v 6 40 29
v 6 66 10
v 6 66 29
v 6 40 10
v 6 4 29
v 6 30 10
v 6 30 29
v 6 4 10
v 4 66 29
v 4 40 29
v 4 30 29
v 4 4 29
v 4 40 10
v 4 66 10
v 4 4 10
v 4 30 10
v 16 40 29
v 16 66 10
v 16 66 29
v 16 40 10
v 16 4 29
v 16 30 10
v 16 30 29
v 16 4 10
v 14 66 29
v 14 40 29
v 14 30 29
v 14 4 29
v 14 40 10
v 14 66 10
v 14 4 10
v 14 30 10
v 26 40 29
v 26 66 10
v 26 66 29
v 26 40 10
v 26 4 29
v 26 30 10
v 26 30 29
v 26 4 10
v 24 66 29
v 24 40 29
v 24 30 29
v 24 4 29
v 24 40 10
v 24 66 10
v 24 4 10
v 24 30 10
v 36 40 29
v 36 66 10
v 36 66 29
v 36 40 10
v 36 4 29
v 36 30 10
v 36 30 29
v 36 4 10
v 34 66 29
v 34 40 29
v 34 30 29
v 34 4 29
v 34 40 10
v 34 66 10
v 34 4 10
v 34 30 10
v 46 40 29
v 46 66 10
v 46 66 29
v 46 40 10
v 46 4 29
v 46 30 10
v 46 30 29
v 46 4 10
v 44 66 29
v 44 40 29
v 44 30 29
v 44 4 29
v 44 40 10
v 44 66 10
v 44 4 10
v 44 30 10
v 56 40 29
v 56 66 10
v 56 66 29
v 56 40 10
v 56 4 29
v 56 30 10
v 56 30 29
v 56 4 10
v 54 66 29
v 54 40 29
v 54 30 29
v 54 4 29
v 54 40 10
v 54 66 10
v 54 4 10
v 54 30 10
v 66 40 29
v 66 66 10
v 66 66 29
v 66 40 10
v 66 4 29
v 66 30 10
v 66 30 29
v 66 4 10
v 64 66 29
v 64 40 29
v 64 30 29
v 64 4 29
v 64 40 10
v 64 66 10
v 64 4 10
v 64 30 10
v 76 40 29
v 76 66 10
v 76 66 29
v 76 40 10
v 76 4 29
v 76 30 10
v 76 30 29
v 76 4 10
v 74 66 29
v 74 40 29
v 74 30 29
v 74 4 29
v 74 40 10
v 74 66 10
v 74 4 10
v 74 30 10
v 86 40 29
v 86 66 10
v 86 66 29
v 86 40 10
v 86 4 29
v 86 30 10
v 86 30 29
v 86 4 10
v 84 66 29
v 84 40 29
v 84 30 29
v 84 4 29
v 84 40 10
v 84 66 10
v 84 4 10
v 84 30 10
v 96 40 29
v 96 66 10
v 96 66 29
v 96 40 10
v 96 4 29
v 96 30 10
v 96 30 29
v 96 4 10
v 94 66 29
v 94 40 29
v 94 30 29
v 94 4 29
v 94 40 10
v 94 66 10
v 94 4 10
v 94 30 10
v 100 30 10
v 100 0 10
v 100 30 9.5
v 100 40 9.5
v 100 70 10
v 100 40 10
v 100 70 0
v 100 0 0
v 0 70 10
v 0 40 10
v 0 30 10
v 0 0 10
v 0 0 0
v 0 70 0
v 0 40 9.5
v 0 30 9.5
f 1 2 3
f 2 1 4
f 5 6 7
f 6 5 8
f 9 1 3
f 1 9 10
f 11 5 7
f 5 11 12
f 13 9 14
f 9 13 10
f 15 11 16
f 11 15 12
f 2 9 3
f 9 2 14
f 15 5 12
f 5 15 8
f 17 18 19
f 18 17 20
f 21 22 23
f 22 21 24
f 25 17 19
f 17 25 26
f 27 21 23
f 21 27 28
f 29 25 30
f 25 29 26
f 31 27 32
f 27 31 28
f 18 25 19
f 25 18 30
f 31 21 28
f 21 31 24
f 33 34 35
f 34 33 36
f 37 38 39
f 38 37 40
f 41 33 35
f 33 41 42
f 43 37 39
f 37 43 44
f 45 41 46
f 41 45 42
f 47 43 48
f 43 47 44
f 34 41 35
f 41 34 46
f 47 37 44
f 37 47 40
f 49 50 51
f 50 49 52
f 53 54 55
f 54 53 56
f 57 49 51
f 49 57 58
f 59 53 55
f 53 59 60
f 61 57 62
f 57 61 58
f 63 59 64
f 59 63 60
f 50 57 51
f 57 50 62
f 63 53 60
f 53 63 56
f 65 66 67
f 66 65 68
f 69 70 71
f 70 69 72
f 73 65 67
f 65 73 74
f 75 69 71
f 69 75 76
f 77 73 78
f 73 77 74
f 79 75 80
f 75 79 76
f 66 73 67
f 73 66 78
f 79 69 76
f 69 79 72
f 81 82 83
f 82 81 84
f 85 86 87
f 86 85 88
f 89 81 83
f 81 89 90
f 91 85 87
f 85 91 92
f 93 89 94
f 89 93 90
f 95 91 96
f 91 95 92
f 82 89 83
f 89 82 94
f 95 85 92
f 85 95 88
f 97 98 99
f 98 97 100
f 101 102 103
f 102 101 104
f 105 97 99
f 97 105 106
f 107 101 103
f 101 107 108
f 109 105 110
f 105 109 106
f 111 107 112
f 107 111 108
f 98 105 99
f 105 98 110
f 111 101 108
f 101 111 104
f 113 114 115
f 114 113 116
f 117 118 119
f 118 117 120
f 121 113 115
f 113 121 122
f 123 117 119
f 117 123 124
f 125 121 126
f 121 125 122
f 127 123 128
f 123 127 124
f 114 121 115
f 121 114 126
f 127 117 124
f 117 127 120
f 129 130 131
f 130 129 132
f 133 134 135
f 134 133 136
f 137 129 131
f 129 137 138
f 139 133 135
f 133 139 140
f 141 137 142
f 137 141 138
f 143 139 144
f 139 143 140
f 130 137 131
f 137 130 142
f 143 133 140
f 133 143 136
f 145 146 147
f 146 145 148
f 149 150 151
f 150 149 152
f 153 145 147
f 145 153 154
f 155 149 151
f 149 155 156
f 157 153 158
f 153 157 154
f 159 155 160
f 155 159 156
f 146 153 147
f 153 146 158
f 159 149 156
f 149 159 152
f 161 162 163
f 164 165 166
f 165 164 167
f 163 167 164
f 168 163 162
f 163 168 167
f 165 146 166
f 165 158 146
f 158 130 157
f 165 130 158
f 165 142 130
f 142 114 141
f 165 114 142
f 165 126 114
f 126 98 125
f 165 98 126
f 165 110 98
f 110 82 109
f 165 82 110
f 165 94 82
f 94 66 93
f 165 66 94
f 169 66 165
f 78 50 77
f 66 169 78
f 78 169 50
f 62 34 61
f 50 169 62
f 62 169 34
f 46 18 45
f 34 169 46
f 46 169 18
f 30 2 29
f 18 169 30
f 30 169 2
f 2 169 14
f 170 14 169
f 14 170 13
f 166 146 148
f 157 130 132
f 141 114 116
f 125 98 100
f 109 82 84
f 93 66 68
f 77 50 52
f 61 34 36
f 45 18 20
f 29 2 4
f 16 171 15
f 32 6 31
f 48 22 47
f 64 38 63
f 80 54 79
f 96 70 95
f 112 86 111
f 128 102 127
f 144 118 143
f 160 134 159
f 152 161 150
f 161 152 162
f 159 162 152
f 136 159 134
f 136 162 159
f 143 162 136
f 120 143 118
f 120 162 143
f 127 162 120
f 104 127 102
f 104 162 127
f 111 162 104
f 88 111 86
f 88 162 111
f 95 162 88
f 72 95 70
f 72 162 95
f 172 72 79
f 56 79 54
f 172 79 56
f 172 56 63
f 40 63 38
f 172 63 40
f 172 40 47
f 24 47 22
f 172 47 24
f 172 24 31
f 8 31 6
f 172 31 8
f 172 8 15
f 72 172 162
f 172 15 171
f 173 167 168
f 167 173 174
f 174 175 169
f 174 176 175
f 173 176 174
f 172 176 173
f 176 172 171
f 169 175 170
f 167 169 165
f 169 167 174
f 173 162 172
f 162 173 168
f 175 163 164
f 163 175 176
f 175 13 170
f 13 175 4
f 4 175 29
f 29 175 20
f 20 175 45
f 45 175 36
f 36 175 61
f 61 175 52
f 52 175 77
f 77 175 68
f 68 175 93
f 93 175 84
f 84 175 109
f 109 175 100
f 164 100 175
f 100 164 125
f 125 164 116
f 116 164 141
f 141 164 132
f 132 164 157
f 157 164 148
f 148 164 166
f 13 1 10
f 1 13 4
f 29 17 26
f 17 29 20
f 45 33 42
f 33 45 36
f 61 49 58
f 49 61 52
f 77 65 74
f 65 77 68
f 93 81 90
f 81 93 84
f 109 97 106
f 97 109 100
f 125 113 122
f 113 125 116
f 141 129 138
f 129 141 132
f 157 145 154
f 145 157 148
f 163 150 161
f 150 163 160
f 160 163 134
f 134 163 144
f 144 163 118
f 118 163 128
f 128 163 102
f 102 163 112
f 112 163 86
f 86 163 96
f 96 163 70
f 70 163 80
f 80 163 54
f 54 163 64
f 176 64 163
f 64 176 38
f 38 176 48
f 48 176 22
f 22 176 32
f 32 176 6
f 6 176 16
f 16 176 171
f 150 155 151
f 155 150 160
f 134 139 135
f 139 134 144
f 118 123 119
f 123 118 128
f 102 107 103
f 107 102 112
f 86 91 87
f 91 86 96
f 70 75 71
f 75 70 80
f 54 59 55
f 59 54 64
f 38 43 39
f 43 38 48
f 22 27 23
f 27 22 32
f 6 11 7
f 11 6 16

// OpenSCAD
$fn = 32;

// ----------------------------------------------------------------------
// Heatsink: slotted fin block
// ----------------------------------------------------------------------

// --- parameters (mm) ---
base_l = 100;             // base length, X
base_w = 70;              // base width, Y
base_t = 10;              // base plate thickness
fin_h = 20;               // fin height above the base
fin_t = 2;                // fin thickness
edge = 4;                 // margin from the base ends
pitch = 10;               // fin pitch
slot_w = 10;              // central slot width, Y
fit_tol = 0.05;           // tolerance for press fits, mm
free_tol = 0.2;           // tolerance for clearance fits, mm

n_fins = floor((base_l - 2 * edge - fin_t) / pitch) + 1;  // fin count
total_h = base_t + fin_h - 1;  // overall height

difference() {
union() {
  cube([base_l, base_w, base_t]);
  for (i = [0 : n_fins - 1])
    translate([edge + i * pitch, edge, base_t - 1])
      cube([fin_t, base_w - 2 * edge, fin_h]);
}
  translate([-1, base_w / 2 - slot_w / 2, base_t - 0.5])
    cube([base_l + 2, slot_w, fin_h + 2]);
}
